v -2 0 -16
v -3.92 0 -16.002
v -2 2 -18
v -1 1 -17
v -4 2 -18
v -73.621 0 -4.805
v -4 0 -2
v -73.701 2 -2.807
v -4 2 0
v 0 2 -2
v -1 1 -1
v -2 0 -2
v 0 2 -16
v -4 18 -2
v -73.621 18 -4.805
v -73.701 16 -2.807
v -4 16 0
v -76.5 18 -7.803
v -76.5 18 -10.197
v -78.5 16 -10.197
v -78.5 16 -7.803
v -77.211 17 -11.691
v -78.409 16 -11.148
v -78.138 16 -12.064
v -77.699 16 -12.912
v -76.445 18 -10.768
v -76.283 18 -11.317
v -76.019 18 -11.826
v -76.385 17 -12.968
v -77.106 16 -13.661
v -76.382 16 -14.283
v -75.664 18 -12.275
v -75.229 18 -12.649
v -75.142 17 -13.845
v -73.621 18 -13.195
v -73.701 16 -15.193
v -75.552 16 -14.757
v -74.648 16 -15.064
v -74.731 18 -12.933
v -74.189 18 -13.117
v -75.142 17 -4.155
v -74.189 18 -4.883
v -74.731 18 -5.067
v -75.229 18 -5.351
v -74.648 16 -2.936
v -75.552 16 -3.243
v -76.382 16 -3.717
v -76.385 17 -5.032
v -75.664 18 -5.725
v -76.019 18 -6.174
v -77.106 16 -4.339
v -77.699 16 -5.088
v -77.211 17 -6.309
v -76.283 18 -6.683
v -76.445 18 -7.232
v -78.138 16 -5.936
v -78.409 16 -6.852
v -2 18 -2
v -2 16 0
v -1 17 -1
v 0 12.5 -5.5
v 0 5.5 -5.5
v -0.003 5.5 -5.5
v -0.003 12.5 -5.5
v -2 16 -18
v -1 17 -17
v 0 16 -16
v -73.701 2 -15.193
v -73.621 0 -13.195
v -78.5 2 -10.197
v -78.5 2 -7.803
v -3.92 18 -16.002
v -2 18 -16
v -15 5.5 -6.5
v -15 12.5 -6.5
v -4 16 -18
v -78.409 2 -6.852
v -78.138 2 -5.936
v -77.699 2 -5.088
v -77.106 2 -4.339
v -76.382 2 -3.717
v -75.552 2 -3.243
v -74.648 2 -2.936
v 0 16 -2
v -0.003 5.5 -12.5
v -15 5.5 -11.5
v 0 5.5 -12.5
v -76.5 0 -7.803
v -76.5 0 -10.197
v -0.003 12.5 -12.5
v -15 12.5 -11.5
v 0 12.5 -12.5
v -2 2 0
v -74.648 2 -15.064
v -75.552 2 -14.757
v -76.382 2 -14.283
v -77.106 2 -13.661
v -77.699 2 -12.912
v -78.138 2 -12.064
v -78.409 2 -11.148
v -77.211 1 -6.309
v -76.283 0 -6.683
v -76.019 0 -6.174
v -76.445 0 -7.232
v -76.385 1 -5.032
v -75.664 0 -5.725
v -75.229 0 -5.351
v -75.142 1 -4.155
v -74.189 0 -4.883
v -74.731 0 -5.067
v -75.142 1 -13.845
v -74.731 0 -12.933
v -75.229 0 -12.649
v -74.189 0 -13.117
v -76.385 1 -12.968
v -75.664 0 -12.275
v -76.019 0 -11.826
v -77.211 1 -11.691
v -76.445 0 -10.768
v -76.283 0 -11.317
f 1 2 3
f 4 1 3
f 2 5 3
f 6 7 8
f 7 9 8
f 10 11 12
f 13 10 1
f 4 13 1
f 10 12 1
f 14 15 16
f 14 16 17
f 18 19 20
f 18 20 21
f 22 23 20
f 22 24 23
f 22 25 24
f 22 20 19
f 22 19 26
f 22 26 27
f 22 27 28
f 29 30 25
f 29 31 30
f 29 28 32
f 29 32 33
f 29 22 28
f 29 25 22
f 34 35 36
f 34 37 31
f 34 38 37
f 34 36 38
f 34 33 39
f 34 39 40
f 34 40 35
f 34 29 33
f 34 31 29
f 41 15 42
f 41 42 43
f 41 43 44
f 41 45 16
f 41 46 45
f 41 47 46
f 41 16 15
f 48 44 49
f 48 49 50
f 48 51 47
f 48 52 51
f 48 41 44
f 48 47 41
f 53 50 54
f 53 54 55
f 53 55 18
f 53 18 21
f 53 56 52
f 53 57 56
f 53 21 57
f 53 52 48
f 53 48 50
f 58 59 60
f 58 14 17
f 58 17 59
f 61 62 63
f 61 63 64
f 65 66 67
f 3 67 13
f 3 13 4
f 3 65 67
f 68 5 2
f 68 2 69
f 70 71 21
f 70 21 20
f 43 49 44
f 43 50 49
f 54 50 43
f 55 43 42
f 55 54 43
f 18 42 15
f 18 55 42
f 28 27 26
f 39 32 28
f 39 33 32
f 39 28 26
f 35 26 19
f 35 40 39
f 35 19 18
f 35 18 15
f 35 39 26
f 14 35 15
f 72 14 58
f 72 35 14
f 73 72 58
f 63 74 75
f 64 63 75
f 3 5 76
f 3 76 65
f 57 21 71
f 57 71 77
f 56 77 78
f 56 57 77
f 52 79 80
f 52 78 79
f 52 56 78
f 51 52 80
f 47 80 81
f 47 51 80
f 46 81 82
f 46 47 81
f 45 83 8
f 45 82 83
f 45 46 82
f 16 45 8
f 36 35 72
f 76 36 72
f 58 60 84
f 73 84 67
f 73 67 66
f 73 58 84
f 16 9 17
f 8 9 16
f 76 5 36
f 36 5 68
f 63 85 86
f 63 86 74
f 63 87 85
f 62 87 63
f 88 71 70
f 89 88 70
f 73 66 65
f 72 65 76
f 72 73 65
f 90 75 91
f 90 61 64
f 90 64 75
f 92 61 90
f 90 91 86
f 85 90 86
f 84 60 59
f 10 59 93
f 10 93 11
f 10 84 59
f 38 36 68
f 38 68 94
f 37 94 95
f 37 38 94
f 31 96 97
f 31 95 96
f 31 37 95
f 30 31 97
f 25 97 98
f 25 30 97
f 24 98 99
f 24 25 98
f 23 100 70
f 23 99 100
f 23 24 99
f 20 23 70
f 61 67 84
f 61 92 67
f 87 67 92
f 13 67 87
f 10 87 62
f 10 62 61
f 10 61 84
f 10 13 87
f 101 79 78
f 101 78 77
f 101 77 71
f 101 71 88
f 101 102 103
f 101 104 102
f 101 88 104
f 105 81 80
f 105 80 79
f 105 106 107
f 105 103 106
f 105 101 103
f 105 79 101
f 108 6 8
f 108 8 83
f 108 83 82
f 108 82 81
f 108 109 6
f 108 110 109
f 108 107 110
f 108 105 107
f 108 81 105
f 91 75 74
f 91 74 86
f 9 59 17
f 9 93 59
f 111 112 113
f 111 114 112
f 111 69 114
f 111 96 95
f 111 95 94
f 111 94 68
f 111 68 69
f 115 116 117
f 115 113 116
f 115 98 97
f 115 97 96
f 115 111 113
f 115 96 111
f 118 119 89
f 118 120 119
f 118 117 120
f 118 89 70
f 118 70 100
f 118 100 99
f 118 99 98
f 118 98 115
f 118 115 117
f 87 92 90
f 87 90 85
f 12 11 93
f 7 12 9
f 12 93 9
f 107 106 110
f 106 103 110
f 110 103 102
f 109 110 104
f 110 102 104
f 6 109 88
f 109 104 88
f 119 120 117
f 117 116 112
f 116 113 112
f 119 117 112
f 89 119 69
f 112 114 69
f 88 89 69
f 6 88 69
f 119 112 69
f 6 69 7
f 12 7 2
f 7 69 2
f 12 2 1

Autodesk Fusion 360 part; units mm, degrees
sketch "Sketch1" plane through (0, 0, 0) normal (0, 1, 0) x (1, 0, 0)
  line L0 (0, 0) -> (-78.5, 0)
  line L1 (-78.5, 0) -> (-78.5, 18)
  line L2 (-78.5, 18) -> (0, 18)
  line L3 (0, 18) -> (0, 0)
  line L4 (-4, 18) -> (-78.5, 15)
  line L5 (-4, 0) -> (-78.5, 3)
  dimension "d1" = 78.5
  dimension "d2" = 18
  dimension "d3" = 4
  dimension "d4" = 3
  dimension "d5" = 3
extrude "Extrude1" add sketch "Sketch1" along normal blind 18 contours L0 L1 L2 L3 L4 L5
sketch "Sketch2" plane through (0, 0, 0) normal (1, 0, 0) x (0, 0, -1)
  line L0 (0, 0) -> (18, 0)
  line L1 (18, 0) -> (18, 18)
  line L2 (18, 18) -> (0, 18)
  line L3 (0, 18) -> (0, 0)
  line L4 (18, 18) -> (0, 0) construction
  line L5 (12.5, 5.5) -> (5.5, 5.5)
  line L6 (5.5, 5.5) -> (5.5, 12.5)
  line L7 (5.5, 12.5) -> (12.5, 12.5)
  line L8 (12.5, 12.5) -> (12.5, 5.5)
  line L9 (12.5, 5.5) -> (5.5, 12.5) construction
  line L10 (5.5, 5.5) -> (12.5, 12.5) construction
  point P0 (9, 9)
  dimension "d8" = 7
  dimension "d9" = 7
extrude "Extrude2" cut sketch "Sketch2" against normal blind 15 contours L5 L6 L7 L8
chamfer "Chamfer1" distance 2 angle 45 4 edges at (0, 18, -9) (0, 9, -18) (0, 9, 0) (0, 0, -9)
fillet "Fillet1" radius 5 2 edges at (-78.5, 9, -3) (-78.5, 9, -15)
chamfer "Chamfer3" distance 2 angle 45 14 edges at (-38.8506, 18, -1.4034) (-38.8506, 18, -16.5966) (-77.106, 18, -13.661) (-78.5, 18, -9) (-77.106, 18, -4.339) (-3, 18, -18) (-3, 18, 0) (-38.8506, 0, -1.4034) (-77.106, 0, -4.339) (-78.5, 0, -9) (-77.106, 0, -13.661) (-38.8506, 0, -16.5966) (-3, 0, -18) (-3, 0, 0)
chamfer "Chamfer4" distance 15 distance2 1 2 edges at (-15, 9, -12.5) (-15, 9, -5.5) measured on face at (-5, 10.1667, -12.5) measured on face at (-5, 7.8333, -5.5)
equation "d8 = Switch_Thickness"
equation "d9 = Switch_Thickness"
equation "Switch_Thickness = 7 mm" comment "Thickness of Light Switch Lever"
